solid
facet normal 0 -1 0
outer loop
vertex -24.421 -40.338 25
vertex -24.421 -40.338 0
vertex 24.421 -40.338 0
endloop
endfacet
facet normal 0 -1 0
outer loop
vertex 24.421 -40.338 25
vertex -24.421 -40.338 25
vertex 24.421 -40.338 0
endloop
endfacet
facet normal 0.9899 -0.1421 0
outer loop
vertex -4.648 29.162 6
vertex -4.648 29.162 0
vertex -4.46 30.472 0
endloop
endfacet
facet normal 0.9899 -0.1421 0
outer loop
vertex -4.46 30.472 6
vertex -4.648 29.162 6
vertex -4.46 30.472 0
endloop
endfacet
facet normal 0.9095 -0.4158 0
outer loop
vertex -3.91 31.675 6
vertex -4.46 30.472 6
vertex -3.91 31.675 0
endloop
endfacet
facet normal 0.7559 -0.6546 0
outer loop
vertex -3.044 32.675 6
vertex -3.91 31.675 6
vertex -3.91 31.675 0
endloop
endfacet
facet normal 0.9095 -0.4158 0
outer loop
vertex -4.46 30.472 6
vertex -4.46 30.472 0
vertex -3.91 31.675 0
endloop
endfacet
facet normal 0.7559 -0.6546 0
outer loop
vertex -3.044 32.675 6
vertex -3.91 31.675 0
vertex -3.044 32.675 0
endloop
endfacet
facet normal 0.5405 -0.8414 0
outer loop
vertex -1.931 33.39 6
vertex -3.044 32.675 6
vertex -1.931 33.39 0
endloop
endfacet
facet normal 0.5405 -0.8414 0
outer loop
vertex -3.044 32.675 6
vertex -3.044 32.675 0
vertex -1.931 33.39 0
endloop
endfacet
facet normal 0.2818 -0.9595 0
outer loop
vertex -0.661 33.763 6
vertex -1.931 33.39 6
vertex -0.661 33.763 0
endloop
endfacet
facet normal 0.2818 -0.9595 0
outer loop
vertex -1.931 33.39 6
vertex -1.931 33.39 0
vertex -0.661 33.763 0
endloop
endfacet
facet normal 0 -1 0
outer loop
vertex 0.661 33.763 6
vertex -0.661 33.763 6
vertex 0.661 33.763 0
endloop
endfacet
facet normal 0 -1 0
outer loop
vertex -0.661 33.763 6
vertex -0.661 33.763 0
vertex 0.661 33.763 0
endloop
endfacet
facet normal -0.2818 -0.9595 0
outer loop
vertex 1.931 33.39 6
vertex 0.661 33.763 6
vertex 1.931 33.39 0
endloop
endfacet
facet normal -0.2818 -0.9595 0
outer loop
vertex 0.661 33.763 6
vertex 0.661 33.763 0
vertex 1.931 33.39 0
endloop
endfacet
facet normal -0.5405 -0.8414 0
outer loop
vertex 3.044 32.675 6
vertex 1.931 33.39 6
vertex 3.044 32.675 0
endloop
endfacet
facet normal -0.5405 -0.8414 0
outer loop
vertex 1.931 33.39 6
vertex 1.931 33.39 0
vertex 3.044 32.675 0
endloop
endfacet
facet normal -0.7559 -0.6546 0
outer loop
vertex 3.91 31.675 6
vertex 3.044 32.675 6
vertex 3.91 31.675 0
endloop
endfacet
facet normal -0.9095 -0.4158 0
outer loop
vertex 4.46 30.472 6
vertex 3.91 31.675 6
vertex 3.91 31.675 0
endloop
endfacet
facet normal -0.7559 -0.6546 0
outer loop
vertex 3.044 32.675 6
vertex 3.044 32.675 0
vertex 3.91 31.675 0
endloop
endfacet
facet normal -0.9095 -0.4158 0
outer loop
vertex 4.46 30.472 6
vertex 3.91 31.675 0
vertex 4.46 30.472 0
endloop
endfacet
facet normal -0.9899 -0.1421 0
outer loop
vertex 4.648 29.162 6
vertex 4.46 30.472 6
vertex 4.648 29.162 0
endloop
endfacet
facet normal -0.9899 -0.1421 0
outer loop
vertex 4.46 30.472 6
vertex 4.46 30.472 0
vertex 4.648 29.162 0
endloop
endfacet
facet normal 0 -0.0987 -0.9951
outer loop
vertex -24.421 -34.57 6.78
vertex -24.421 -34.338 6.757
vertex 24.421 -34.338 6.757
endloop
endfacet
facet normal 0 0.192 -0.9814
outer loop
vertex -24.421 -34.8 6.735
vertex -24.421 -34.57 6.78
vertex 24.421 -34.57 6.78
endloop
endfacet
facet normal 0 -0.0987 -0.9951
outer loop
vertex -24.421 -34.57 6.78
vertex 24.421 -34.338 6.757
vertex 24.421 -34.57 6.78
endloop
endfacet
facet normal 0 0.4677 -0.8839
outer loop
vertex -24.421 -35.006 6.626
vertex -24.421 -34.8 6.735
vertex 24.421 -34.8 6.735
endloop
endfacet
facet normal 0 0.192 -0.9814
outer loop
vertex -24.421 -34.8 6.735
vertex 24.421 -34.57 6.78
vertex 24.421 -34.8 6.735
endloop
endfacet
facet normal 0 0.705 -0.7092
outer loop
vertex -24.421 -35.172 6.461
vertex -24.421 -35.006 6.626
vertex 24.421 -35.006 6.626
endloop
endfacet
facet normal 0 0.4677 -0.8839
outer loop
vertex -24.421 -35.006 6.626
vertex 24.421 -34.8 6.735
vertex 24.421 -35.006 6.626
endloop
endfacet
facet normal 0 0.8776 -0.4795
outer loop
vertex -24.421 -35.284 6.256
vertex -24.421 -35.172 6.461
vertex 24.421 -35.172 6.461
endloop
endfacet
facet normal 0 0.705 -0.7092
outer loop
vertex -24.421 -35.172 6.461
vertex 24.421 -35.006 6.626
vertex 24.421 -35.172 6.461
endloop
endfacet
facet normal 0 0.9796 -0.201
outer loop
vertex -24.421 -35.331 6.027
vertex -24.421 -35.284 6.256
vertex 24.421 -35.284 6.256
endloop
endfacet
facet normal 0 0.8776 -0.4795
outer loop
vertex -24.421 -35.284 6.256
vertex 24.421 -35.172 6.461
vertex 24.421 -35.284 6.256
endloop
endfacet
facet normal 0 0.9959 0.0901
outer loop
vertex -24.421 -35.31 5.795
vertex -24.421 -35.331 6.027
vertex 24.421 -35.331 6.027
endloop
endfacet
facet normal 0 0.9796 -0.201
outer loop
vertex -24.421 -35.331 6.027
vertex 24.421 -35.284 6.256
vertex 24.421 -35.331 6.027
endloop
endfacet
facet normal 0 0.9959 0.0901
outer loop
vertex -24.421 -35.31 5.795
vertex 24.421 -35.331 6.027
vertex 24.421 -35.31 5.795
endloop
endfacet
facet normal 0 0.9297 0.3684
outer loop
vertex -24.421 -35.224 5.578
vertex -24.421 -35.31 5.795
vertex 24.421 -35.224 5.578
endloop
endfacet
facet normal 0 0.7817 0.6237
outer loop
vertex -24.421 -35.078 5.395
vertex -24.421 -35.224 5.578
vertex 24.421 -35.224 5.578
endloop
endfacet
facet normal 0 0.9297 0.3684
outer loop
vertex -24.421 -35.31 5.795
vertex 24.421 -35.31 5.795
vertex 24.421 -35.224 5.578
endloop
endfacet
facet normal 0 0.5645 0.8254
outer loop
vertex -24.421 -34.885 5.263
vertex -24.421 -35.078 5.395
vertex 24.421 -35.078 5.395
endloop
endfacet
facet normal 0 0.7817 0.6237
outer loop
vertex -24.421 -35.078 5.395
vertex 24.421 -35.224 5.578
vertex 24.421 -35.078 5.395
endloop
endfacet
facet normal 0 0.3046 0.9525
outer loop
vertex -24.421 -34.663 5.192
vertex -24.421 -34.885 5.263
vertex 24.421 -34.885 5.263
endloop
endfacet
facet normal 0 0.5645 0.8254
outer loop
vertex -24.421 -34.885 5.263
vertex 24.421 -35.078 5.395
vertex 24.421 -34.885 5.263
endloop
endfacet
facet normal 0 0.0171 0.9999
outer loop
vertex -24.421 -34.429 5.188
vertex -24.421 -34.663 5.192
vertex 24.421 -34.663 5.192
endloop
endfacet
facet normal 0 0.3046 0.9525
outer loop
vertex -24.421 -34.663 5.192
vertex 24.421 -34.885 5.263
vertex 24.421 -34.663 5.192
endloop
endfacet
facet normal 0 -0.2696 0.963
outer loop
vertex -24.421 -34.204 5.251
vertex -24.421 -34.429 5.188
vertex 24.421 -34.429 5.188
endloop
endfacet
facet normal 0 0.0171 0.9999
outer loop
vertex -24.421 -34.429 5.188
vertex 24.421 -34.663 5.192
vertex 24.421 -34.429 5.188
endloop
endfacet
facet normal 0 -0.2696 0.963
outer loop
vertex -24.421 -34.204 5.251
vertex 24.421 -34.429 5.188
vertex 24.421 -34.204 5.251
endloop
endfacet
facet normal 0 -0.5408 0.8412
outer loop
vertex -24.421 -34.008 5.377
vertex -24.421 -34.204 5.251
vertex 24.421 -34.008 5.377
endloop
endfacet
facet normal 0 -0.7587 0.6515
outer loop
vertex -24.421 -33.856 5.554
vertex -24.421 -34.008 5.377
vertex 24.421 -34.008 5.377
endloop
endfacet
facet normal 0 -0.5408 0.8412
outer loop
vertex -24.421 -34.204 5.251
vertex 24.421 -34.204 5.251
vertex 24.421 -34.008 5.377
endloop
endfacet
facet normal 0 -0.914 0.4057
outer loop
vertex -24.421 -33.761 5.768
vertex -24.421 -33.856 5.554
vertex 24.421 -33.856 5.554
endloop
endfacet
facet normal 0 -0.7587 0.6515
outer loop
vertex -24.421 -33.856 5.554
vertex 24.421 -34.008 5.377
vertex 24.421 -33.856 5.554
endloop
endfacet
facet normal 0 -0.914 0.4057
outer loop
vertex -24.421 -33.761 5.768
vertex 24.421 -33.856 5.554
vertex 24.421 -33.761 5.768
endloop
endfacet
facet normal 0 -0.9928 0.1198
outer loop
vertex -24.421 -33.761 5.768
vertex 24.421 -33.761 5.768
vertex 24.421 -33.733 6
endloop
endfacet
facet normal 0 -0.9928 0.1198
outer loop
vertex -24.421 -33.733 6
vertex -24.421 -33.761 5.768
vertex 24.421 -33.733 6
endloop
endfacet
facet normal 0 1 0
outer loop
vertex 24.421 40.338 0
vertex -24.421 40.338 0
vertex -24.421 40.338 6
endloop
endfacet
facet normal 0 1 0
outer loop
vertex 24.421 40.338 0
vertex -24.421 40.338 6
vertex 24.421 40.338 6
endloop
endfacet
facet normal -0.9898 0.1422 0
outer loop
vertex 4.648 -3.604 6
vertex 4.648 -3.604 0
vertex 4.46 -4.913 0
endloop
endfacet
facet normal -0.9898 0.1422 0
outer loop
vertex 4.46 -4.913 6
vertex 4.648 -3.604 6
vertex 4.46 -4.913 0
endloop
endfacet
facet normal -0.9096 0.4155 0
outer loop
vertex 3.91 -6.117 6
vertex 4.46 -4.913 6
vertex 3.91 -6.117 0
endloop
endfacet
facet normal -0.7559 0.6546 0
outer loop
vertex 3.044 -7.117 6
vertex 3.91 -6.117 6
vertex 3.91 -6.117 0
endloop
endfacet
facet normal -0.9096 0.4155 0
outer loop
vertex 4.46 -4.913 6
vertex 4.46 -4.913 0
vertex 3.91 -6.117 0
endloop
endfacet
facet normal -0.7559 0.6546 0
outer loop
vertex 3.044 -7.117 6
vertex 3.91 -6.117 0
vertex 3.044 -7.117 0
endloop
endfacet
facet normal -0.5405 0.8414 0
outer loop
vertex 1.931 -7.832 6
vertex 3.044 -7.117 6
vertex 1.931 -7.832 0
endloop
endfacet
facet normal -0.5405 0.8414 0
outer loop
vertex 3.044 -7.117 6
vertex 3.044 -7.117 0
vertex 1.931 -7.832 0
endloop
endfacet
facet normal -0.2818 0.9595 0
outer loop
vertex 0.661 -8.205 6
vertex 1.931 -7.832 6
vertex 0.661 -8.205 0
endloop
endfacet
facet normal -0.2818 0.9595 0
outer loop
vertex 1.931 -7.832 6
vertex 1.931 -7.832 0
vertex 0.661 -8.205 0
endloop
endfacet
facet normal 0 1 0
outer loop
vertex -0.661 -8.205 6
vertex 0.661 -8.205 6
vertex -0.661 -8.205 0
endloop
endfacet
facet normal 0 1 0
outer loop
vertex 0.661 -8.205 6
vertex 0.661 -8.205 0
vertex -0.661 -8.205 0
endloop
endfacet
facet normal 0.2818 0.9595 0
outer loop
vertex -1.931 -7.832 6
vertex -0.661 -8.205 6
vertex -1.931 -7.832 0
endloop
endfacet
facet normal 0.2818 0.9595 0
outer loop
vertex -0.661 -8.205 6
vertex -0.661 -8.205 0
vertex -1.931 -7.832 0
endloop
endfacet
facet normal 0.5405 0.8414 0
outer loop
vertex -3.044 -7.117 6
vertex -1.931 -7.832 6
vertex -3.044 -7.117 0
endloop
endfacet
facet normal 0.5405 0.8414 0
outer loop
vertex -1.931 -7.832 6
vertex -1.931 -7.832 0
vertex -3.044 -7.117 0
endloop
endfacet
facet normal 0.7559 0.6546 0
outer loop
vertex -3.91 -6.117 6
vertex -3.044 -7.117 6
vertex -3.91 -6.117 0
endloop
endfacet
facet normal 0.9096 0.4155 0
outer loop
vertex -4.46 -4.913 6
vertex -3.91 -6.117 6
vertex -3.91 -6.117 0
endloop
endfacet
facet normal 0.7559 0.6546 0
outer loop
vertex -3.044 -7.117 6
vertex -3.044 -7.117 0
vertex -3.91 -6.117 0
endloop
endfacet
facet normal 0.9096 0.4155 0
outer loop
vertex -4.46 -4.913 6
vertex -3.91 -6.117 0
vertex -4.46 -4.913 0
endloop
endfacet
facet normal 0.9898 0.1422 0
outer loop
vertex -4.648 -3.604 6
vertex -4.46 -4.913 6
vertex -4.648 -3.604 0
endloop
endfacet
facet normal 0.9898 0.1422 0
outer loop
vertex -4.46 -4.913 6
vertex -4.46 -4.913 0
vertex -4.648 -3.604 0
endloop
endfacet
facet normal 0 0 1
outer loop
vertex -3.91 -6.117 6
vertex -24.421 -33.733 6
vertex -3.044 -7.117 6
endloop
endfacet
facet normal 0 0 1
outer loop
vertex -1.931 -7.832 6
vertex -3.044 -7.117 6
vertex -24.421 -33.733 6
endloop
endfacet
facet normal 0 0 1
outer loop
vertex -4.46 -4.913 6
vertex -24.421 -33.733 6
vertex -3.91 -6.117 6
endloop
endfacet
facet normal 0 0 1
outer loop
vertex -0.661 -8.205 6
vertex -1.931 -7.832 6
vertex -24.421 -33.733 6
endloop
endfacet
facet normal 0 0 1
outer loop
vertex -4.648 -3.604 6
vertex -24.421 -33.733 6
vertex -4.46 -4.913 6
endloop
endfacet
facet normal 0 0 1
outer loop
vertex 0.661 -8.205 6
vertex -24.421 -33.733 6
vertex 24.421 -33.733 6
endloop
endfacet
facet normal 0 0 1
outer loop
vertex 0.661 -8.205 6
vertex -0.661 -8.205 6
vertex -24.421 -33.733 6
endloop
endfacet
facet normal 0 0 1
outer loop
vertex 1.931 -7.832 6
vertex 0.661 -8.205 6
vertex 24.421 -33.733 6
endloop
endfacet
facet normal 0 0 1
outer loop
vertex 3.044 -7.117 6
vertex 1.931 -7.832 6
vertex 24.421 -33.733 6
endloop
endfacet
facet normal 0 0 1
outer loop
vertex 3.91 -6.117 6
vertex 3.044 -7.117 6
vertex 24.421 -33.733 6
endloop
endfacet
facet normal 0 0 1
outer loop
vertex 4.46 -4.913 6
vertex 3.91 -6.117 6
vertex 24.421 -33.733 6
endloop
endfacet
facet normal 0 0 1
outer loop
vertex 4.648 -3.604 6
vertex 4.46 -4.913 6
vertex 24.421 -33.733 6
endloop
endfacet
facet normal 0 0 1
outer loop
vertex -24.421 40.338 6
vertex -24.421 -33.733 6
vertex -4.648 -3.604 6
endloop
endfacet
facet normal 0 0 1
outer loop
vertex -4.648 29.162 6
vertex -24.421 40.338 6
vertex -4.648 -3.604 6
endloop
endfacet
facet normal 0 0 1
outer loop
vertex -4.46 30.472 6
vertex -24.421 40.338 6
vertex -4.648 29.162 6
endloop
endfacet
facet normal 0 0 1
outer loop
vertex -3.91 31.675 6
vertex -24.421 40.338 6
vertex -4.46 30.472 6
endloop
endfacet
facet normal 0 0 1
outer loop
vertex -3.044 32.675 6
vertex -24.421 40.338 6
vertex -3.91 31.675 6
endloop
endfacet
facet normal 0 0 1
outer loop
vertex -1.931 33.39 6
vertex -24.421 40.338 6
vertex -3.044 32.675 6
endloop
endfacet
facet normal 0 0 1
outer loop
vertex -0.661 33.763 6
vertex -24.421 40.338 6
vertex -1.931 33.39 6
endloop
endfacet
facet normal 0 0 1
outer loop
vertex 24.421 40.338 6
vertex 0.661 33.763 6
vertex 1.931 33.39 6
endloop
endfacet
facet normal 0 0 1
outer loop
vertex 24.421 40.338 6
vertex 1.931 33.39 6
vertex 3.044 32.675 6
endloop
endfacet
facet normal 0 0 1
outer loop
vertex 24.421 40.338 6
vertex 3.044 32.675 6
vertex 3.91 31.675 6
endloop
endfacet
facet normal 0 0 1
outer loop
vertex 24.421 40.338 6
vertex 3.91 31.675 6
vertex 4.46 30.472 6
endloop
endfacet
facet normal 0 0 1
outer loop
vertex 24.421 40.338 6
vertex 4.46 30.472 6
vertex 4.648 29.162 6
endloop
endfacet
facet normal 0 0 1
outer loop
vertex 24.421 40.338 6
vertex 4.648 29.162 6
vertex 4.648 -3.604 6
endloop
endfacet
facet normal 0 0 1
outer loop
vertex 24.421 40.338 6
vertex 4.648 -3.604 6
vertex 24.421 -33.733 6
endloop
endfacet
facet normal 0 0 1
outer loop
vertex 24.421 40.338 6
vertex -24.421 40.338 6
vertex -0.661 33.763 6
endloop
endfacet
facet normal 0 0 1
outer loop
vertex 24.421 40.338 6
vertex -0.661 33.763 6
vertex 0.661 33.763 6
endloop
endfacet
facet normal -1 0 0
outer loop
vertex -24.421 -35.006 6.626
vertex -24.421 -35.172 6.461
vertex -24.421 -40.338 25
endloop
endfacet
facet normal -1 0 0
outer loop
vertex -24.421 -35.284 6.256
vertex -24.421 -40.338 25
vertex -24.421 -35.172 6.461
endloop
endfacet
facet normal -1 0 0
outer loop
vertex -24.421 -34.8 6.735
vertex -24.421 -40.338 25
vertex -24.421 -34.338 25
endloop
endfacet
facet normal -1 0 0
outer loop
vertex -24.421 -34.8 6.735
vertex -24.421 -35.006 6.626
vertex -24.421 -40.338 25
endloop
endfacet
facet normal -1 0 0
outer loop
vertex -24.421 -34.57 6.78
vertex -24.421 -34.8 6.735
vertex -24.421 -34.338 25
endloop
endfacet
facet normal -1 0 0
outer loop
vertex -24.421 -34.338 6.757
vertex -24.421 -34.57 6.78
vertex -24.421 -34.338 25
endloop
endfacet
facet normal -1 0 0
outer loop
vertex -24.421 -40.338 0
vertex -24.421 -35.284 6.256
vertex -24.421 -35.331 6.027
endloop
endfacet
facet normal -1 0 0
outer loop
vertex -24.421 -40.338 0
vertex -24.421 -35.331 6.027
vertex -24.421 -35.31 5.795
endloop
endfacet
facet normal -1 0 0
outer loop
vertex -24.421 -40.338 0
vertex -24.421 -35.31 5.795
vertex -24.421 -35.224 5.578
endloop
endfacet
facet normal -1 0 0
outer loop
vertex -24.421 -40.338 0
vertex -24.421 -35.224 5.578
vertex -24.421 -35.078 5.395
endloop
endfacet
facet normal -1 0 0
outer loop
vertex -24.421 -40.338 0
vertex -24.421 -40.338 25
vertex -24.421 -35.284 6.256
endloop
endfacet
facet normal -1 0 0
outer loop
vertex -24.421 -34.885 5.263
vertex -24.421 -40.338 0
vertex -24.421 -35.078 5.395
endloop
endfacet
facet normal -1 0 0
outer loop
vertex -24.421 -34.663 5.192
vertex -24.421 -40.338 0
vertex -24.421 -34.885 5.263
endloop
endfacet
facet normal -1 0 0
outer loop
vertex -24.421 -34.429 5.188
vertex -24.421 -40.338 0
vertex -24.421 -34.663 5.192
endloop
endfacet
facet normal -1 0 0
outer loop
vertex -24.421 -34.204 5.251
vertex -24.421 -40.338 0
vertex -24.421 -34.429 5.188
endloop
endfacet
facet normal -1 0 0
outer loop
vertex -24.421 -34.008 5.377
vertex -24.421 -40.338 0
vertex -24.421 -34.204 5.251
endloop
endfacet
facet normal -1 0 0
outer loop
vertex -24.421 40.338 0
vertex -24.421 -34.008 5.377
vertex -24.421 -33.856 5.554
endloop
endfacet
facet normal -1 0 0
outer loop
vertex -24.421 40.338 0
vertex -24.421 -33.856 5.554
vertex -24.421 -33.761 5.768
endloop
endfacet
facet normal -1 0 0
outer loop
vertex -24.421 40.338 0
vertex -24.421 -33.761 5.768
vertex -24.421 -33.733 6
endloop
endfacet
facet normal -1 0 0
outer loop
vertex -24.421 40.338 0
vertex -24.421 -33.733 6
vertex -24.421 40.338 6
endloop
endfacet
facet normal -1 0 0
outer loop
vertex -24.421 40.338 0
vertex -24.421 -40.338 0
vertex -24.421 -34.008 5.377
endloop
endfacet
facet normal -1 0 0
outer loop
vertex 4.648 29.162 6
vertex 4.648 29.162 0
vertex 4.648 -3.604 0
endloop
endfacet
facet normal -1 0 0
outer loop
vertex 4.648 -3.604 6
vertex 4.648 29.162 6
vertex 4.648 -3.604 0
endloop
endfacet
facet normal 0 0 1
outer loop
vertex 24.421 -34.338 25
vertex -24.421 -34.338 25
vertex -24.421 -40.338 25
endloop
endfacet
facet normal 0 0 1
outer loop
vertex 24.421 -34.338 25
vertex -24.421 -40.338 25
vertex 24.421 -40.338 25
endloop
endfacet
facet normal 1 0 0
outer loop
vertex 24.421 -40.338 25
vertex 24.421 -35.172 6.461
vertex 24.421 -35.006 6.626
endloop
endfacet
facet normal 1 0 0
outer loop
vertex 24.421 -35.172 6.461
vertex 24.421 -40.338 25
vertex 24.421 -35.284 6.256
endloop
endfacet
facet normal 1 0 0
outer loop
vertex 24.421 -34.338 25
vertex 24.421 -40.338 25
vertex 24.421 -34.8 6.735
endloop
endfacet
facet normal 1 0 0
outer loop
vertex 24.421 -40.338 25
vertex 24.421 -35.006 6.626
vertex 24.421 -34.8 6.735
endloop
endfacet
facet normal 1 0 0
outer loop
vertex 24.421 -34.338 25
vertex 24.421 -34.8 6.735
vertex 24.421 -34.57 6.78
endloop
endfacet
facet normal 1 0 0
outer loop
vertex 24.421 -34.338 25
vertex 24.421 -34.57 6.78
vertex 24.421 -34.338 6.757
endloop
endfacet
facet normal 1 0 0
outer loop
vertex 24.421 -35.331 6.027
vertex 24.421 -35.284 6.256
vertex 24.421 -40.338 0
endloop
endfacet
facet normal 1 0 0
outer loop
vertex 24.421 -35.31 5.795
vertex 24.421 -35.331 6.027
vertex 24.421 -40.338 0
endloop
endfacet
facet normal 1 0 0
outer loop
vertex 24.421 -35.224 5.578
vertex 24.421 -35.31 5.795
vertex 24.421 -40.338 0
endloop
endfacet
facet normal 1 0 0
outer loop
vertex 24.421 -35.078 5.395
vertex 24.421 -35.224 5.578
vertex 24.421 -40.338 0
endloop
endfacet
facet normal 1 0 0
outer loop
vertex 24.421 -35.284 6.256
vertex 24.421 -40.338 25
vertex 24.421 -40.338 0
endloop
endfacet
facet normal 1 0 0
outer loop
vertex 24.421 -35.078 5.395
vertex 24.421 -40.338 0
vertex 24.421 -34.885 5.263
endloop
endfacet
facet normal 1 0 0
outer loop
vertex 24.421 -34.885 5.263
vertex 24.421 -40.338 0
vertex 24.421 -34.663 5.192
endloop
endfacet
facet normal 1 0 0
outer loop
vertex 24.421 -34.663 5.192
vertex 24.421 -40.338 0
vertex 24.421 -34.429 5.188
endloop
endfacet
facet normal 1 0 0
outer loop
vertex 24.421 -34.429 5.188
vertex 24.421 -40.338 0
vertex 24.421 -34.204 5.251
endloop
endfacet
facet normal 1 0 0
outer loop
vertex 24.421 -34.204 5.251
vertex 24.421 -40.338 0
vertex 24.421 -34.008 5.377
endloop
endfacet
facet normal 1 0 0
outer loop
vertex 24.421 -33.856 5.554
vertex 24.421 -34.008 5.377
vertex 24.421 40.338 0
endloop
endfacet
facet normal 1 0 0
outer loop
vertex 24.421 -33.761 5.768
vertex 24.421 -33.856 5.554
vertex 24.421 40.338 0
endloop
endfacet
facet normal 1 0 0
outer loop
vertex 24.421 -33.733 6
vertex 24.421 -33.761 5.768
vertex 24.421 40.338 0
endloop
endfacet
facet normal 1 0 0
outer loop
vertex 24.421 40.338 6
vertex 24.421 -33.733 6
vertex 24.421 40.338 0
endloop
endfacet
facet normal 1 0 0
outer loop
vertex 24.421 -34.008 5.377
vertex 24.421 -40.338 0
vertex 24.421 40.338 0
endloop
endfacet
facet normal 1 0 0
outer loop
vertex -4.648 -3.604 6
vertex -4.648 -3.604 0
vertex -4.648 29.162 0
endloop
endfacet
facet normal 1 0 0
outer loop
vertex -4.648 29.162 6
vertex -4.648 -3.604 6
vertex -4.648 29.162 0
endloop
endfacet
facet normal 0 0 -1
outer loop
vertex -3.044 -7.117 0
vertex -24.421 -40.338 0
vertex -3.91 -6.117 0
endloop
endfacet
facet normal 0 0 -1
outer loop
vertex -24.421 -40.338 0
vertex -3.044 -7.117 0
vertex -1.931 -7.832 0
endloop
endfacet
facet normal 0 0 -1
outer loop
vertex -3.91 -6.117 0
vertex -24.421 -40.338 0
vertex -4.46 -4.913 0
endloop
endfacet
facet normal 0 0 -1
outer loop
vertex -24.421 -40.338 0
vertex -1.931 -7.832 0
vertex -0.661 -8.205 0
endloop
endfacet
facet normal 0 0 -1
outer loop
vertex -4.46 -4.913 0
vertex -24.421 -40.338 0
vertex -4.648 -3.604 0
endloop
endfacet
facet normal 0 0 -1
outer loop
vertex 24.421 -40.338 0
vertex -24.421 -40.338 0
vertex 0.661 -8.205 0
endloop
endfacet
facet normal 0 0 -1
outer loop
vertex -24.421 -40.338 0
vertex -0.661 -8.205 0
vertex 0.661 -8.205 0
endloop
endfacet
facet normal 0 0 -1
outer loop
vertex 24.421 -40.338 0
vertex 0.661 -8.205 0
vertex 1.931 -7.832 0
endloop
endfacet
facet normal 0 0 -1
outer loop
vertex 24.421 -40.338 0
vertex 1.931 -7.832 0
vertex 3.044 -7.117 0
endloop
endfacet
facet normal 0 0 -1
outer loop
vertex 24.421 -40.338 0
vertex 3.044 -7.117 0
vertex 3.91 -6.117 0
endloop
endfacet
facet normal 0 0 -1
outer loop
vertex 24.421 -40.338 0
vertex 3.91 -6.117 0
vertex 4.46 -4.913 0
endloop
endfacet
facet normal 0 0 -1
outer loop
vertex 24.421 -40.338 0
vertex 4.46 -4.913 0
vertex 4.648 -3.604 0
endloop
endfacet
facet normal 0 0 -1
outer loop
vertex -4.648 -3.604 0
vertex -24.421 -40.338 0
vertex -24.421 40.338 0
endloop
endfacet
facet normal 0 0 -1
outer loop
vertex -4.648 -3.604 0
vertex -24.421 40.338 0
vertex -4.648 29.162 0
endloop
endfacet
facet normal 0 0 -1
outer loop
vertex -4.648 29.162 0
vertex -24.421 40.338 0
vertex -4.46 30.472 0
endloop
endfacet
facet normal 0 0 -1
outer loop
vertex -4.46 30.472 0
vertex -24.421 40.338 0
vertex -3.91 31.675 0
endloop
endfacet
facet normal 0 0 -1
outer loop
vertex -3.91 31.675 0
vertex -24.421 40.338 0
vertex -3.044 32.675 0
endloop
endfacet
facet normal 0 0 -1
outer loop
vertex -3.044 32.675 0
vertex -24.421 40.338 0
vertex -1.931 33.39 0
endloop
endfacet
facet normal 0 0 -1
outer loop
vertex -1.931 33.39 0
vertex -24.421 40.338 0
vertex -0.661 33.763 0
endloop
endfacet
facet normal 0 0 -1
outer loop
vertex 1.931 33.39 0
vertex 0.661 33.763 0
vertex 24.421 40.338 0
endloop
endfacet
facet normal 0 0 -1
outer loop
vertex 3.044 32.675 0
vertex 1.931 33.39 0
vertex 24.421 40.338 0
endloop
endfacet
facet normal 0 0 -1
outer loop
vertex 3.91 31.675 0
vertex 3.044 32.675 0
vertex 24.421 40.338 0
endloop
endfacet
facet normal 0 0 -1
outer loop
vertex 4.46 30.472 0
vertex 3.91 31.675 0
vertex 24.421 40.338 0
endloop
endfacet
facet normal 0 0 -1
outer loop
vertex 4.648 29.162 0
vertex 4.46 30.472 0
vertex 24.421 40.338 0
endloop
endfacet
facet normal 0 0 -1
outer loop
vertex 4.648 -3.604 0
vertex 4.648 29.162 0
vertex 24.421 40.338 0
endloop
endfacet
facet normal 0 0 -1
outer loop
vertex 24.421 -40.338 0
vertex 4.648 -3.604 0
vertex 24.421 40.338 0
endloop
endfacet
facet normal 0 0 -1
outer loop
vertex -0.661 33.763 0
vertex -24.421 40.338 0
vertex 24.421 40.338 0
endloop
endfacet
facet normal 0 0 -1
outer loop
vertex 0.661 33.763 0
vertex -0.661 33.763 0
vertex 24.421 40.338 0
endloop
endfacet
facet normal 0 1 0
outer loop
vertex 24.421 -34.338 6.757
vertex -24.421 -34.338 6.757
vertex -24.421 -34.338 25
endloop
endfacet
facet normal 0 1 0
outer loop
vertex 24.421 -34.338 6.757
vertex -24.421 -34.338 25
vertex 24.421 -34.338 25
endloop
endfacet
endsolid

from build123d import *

# Parameters (mm, degrees)
F0_W     = 48.8410666585
F0_H     = 6
F1_DEPTH = 25
F0_H_2   = 74.675624311
F2_DEPTH = 6
F3_R     = 0.8
F4_DEPTH = 25.25


with BuildPart() as f1:
    # F0 (on Top) → F1 (new body)
    with BuildSketch(Plane.XY):
        with Locations((0, -37.3378121555)):
            Rectangle(F0_W, F0_H)
    extrude(amount=F1_DEPTH)

    # F0 (on Top) → F2 (join)
    with BuildSketch(Plane.XY):
        with Locations((0, -37.3378121555)):
            Rectangle(F0_W, F0_H)
        with Locations((0, 3)):
            Rectangle(F0_W, F0_H_2)
        with BuildLine():
            Line((4.648, 29.1621878445), (4.648, -3.6038121555))
            ThreePointArc((4.648, -3.6038121555), (0, -8.2518121555), (-4.648, -3.6038121555))
            Line((-4.648, -3.6038121555), (-4.648, 29.1621878445))
            ThreePointArc((-4.648, 29.1621878445), (0, 33.8101878445), (4.648, 29.1621878445))
        make_face(mode=Mode.SUBTRACT)
    extrude(amount=F2_DEPTH)

    # F3 (on Right) → F4 (cut, symmetric)
    with BuildSketch(Plane.YZ):
        with Locations((-34.5324325053, 5.9808787941)):
            Circle(F3_R)
    extrude(amount=F4_DEPTH, both=True, mode=Mode.SUBTRACT)


solid = f1.part
